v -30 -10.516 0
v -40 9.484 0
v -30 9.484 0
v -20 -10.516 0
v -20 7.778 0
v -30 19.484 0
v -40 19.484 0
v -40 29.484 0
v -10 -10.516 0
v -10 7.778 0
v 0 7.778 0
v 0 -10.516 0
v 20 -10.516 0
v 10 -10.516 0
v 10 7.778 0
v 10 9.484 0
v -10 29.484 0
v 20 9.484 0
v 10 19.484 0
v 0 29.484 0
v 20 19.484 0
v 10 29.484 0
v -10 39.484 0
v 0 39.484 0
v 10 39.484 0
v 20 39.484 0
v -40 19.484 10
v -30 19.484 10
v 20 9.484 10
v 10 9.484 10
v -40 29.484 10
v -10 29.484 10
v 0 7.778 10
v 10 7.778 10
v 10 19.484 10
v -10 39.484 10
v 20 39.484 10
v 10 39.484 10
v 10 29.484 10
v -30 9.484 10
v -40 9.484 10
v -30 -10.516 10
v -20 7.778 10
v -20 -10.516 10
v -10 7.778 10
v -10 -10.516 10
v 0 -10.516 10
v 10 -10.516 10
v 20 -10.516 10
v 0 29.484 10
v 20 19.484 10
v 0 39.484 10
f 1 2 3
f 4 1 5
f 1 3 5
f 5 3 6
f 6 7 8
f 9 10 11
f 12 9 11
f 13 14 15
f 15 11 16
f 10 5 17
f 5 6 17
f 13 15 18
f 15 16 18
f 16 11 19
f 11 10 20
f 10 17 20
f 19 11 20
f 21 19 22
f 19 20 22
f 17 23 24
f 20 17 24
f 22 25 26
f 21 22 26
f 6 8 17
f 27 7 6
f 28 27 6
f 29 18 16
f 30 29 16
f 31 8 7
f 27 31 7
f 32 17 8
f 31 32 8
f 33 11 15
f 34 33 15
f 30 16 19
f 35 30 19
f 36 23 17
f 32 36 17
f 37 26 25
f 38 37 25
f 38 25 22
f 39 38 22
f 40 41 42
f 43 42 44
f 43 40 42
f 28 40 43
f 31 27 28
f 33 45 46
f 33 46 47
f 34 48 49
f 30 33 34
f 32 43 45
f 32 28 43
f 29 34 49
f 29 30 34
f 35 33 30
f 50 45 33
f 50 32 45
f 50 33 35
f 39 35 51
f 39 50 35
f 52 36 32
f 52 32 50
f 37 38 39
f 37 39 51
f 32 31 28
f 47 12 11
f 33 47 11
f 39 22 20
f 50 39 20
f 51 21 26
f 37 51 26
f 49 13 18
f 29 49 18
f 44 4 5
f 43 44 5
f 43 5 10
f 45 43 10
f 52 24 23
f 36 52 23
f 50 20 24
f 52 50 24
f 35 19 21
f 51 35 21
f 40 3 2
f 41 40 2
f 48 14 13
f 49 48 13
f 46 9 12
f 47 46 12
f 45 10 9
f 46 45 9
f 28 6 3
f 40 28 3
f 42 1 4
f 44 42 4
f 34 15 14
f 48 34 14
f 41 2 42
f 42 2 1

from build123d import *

# Parameters (mm, degrees)
F1_DEPTH = 10


with BuildPart() as f1:
    # F0 (on Top) → F1 (new body)
    with BuildSketch(Plane.XY):
        Polygon((-10, 29.483898), (-29.91453, 29.483898), (-40, 29.483898), (-40, 19.483898), (-30, 19.483898), (-30, 9.483898), (-40, 9.483898), (-30, -10.516102), (-20, -10.516102), (-20, 7.777781), (-10, 7.777781), (-10, -10.516102), (0, -10.516102), (0, 7.777781), (10, 7.777781), (10, -10.516102), (20, -10.516102), (20, 9.483898), (10, 9.483898), (10, 19.483898), (20, 19.483898), (20, 39.483898), (10, 39.483898), (10, 29.483898), (0, 29.483898), (0, 39.483898), (-10, 39.483898), align=None)
    extrude(amount=F1_DEPTH)


solid = f1.part
